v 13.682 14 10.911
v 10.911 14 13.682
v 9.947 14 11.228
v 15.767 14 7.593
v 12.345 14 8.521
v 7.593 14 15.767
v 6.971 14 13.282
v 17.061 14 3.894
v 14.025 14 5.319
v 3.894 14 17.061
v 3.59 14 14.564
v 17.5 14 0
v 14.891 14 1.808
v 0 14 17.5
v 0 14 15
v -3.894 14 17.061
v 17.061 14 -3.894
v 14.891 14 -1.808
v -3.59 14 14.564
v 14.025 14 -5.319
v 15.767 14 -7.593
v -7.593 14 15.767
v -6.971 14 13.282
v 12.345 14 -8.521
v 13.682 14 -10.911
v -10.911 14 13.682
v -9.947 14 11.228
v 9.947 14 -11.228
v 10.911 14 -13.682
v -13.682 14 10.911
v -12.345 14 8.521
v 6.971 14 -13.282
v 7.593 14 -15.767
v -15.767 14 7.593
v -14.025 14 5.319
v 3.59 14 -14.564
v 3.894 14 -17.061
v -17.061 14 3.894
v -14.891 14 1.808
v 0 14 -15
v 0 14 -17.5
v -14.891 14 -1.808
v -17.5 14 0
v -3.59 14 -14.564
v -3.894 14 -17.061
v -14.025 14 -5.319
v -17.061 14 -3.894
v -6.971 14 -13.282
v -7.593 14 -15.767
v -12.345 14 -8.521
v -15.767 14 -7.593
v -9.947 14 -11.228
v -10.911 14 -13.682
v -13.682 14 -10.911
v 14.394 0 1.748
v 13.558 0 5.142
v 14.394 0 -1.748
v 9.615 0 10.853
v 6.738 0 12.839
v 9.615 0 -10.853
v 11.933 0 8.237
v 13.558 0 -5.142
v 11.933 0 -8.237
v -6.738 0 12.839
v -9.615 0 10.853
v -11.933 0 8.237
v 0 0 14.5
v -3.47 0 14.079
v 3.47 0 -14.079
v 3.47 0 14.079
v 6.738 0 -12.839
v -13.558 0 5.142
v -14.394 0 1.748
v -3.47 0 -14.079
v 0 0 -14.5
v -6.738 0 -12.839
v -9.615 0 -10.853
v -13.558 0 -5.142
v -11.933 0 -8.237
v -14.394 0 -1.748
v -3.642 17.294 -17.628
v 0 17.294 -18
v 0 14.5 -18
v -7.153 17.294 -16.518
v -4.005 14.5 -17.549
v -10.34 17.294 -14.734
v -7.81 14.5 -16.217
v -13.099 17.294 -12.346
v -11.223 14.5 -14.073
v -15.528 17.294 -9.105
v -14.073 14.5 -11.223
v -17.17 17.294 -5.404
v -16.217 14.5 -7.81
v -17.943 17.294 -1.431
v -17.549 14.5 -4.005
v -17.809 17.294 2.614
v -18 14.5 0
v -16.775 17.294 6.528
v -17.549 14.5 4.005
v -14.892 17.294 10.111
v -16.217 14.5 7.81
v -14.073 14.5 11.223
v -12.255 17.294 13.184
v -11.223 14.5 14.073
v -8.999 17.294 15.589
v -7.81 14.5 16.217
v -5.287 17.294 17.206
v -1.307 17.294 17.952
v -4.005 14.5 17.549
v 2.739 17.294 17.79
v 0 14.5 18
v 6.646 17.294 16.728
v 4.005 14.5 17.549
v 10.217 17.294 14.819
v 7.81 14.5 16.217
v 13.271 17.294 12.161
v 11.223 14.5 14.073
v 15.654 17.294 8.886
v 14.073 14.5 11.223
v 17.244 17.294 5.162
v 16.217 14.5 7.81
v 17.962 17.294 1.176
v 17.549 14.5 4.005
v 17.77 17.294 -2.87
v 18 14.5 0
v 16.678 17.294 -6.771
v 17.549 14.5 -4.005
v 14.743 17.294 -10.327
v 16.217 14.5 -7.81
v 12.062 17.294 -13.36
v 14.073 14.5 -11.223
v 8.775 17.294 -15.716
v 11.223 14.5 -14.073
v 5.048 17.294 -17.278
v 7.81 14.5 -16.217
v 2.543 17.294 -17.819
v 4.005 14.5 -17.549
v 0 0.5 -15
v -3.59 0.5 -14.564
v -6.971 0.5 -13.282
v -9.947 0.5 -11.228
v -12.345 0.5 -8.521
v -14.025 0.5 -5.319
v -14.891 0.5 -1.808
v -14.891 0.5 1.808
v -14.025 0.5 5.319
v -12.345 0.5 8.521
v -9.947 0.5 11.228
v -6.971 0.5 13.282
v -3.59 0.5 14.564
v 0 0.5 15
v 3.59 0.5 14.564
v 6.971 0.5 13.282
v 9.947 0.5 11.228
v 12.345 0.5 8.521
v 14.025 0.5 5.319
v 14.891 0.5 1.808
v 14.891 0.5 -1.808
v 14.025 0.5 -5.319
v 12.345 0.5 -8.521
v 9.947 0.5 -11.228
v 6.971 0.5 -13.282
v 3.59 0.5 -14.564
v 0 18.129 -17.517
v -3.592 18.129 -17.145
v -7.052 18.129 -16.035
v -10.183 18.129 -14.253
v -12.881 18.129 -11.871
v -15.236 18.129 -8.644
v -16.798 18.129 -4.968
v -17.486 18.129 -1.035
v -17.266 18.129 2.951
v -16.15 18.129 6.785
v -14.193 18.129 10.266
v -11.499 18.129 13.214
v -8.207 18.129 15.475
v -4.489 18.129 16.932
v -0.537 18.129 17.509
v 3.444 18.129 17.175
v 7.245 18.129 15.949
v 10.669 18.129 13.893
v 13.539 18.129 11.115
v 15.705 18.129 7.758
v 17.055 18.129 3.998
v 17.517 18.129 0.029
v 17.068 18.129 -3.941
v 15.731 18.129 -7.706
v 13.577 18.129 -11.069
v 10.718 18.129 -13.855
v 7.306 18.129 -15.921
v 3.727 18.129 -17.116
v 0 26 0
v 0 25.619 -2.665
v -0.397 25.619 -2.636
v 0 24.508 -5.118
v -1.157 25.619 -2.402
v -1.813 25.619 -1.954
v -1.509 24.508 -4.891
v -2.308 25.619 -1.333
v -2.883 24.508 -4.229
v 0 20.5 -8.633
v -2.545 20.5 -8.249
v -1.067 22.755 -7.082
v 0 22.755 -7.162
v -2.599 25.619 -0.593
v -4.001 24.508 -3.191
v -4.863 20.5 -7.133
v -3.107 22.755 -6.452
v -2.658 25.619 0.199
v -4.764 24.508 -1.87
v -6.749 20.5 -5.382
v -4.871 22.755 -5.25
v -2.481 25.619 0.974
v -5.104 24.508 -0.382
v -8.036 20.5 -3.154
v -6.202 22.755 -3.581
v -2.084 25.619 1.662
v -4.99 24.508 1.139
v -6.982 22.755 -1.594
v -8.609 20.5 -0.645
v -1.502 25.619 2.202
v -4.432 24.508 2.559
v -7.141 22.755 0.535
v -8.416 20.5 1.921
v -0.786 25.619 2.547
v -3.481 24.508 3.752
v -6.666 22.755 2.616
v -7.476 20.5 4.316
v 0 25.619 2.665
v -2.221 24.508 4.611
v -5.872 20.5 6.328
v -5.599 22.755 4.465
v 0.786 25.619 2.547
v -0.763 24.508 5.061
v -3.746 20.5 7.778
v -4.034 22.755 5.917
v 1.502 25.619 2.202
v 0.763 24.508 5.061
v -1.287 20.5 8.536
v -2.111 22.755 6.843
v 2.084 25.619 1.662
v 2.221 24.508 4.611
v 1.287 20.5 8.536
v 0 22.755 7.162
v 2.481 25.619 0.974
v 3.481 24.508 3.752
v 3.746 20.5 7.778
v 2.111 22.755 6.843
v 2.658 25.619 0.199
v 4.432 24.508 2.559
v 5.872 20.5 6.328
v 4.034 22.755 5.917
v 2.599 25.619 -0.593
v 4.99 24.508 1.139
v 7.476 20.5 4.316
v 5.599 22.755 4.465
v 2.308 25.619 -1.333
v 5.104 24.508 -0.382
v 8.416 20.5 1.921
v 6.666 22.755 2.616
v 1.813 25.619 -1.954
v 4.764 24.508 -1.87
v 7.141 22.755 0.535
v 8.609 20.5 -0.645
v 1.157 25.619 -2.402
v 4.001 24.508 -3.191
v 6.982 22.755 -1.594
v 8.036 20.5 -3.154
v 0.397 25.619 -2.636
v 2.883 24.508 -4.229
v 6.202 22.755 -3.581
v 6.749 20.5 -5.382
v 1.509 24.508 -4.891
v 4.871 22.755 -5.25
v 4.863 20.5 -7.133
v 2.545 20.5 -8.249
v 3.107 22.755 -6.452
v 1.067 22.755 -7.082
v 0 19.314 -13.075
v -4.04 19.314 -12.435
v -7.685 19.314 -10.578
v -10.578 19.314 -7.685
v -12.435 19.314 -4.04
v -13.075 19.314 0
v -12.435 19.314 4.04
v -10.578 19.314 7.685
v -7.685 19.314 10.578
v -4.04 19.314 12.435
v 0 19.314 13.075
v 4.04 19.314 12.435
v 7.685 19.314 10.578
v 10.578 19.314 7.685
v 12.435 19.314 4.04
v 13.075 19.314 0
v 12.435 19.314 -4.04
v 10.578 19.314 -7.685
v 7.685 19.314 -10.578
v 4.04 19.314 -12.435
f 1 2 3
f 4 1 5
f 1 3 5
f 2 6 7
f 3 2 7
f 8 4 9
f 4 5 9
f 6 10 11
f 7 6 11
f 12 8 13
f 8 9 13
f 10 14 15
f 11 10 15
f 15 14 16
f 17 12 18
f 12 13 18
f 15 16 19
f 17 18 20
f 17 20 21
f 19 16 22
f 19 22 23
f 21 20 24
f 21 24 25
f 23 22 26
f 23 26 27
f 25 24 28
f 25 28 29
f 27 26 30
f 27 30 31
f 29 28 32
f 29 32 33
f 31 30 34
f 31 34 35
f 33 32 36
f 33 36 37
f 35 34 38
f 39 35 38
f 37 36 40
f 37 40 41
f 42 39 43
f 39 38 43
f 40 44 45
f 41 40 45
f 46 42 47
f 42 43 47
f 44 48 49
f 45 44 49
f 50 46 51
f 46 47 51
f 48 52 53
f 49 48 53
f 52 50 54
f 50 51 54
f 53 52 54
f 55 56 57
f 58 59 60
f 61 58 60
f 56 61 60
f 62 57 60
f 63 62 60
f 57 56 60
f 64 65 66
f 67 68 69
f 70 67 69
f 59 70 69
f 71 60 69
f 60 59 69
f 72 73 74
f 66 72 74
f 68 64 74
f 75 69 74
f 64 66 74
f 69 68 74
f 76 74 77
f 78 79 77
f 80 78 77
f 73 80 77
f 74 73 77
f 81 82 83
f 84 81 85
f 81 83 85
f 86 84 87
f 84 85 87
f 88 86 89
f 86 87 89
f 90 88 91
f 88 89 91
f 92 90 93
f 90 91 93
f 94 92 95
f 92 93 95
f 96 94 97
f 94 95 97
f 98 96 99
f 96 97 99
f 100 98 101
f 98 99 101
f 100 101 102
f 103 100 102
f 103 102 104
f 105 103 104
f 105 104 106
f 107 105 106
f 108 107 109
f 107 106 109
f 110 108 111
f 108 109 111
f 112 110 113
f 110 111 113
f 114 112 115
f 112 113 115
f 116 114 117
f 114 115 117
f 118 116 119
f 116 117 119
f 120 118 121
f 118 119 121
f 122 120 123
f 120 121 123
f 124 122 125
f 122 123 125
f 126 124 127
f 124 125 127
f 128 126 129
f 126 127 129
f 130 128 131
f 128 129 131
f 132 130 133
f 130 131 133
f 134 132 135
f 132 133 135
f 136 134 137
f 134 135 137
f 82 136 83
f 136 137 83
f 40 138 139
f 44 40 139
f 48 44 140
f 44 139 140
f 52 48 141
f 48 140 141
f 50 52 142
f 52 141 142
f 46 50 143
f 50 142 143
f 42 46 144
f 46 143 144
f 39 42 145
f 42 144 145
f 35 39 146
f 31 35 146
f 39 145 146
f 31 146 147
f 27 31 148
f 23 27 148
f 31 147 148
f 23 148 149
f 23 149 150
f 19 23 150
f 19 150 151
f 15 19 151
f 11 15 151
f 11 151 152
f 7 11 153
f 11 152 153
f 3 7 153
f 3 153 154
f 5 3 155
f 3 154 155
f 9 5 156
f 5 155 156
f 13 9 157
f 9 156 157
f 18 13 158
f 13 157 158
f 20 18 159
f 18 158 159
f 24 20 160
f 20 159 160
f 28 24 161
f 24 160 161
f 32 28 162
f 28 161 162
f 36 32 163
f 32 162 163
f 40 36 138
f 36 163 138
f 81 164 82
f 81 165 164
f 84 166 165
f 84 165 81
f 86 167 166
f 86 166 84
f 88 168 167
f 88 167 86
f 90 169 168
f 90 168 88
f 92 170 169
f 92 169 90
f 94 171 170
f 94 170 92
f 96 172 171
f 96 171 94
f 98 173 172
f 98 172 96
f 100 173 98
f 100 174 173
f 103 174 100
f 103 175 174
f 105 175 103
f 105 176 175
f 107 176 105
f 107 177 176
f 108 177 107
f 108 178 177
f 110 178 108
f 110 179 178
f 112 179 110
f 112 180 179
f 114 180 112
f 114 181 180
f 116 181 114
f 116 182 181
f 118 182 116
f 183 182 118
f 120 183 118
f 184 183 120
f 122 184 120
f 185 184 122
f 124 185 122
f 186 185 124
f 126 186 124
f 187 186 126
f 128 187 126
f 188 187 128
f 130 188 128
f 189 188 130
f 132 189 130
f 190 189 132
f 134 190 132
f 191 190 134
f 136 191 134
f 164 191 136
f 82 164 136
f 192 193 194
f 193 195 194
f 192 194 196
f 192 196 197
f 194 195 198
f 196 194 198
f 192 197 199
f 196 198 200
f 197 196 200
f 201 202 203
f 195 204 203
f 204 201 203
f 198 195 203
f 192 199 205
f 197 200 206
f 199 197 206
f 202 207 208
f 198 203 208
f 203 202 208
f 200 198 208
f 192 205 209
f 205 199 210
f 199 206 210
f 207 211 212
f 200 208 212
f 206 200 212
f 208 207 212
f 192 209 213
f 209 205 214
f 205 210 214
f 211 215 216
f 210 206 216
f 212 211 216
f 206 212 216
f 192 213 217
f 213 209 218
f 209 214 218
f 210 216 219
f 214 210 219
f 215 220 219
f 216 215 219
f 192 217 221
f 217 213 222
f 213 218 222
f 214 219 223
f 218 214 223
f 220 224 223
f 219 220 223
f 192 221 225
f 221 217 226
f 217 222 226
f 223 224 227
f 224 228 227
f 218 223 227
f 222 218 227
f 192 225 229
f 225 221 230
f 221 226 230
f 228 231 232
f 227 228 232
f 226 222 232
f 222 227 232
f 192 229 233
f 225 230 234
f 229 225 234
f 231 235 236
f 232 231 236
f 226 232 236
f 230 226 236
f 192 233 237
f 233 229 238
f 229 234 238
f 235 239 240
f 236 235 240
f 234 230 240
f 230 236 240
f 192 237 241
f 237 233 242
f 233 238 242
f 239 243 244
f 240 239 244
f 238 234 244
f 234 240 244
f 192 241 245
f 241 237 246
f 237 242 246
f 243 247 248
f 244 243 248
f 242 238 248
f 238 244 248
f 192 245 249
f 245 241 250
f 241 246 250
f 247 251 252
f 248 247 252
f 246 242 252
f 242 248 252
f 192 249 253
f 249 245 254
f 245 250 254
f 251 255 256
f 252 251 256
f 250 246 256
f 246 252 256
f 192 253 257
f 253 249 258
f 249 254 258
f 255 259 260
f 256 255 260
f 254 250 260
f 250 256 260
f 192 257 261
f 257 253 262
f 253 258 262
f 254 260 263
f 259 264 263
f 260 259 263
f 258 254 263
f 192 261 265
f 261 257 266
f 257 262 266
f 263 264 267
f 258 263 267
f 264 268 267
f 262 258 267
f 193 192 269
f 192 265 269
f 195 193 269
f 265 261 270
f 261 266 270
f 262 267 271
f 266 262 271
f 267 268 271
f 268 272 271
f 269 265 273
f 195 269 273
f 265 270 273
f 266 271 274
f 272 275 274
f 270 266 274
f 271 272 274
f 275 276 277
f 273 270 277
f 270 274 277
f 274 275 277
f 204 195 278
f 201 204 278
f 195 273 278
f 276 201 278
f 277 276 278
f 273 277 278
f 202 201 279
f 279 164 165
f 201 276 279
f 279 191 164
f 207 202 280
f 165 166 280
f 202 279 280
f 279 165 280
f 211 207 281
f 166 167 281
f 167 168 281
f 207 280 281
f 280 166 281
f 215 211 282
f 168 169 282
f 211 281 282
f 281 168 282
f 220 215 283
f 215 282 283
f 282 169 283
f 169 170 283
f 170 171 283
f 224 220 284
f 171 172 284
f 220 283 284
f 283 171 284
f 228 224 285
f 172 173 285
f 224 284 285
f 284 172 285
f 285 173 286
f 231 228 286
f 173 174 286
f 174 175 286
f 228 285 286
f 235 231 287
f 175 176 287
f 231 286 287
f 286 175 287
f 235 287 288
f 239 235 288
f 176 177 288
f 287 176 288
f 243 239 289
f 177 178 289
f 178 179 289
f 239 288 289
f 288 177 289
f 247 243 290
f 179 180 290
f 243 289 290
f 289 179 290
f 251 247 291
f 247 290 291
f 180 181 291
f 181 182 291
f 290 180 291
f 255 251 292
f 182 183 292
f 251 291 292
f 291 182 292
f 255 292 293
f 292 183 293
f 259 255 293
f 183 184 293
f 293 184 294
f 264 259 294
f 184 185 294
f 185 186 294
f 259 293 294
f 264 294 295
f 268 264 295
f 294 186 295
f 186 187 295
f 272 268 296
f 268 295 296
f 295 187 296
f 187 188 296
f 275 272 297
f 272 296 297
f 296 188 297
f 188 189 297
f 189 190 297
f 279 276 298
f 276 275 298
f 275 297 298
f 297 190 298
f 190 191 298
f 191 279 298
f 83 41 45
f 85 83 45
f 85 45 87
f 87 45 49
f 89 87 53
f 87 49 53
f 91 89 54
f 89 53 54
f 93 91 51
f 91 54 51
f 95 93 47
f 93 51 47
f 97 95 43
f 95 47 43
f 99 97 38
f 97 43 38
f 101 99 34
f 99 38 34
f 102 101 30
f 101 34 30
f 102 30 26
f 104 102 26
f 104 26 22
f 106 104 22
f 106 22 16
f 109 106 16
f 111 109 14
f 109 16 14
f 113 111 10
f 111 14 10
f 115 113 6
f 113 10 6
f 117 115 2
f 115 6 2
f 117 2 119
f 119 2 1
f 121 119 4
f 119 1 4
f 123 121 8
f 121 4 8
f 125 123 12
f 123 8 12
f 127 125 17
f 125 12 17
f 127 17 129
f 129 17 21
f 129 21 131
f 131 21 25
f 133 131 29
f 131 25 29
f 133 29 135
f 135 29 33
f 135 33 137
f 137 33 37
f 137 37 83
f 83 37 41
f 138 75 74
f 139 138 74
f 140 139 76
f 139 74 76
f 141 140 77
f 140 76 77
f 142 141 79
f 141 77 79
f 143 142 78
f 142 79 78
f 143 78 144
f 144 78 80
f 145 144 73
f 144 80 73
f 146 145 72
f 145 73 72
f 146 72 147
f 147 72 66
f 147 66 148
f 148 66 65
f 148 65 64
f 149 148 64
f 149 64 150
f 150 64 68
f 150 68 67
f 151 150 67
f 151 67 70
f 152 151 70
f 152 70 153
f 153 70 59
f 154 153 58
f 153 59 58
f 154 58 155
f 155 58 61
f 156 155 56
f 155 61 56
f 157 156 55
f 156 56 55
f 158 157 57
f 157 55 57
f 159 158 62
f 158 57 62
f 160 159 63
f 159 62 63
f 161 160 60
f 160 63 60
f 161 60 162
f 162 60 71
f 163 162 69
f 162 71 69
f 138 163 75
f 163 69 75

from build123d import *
from OCP.BRepFilletAPI import BRepFilletAPI_MakeChamfer

# Parameters (mm, degrees)
CHAMFER_1_SIZE  = 0.5
CHAMFER_1_SIZE2 = 0.70589663


with BuildPart() as part:
    # 草图2 → 旋转1 (revolve)
    with BuildSketch(Plane.XY, mode=Mode.PRIVATE) as revolve_1_sk:
        with BuildLine():
            Line((0, 0), (0, 26))
            ThreePointArc((0, 26), (5.117983001, 24.508173408), (8.63278634, 20.5))
            Line((8.63278634, 20.5), (18, 18))
            Line((18, 18), (18, 14))
            Line((18, 14), (15, 14))
            Line((15, 14), (15, 0))
            Line((15, 0), (0, 0))
        make_face()
    revolve(revolve_1_sk.sketch.rotate(Axis((0, 0, 0), (0, 1, 0)), 90), axis=Axis((0, 0, 0), (0, 1, 0)))

    # 倒角1: one chamfer whose edges measure the first distance from different faces: ONE call of the kernel's chamfer builder (chamfer() names one face for all edges)
    chamfer_1_edges_1 = [part.edges().sort_by_distance(p)[0] for p in [
        (0, 18, 18),
    ]]
    chamfer_1_side_1 = [part.faces().sort_by_distance(p)[0] for p in [
        (0, 19.25, 13.31639317),
    ]]
    chamfer_1_edges_2 = [part.edges().sort_by_distance(p)[0] for p in [
        (0, 14, 18),
        (0, 0, 15),
    ]]
    chamfer_1 = BRepFilletAPI_MakeChamfer(part.part.solid().wrapped)
    for e in chamfer_1_edges_1:
        chamfer_1.Add(CHAMFER_1_SIZE, CHAMFER_1_SIZE2, e.wrapped, chamfer_1_side_1[0].wrapped)  # the first distance lies on this face
    for e in chamfer_1_edges_2:
        chamfer_1.Add(CHAMFER_1_SIZE, e.wrapped)
    add(Compound.cast(chamfer_1.Shape()), mode=Mode.REPLACE)


solid = part.part
